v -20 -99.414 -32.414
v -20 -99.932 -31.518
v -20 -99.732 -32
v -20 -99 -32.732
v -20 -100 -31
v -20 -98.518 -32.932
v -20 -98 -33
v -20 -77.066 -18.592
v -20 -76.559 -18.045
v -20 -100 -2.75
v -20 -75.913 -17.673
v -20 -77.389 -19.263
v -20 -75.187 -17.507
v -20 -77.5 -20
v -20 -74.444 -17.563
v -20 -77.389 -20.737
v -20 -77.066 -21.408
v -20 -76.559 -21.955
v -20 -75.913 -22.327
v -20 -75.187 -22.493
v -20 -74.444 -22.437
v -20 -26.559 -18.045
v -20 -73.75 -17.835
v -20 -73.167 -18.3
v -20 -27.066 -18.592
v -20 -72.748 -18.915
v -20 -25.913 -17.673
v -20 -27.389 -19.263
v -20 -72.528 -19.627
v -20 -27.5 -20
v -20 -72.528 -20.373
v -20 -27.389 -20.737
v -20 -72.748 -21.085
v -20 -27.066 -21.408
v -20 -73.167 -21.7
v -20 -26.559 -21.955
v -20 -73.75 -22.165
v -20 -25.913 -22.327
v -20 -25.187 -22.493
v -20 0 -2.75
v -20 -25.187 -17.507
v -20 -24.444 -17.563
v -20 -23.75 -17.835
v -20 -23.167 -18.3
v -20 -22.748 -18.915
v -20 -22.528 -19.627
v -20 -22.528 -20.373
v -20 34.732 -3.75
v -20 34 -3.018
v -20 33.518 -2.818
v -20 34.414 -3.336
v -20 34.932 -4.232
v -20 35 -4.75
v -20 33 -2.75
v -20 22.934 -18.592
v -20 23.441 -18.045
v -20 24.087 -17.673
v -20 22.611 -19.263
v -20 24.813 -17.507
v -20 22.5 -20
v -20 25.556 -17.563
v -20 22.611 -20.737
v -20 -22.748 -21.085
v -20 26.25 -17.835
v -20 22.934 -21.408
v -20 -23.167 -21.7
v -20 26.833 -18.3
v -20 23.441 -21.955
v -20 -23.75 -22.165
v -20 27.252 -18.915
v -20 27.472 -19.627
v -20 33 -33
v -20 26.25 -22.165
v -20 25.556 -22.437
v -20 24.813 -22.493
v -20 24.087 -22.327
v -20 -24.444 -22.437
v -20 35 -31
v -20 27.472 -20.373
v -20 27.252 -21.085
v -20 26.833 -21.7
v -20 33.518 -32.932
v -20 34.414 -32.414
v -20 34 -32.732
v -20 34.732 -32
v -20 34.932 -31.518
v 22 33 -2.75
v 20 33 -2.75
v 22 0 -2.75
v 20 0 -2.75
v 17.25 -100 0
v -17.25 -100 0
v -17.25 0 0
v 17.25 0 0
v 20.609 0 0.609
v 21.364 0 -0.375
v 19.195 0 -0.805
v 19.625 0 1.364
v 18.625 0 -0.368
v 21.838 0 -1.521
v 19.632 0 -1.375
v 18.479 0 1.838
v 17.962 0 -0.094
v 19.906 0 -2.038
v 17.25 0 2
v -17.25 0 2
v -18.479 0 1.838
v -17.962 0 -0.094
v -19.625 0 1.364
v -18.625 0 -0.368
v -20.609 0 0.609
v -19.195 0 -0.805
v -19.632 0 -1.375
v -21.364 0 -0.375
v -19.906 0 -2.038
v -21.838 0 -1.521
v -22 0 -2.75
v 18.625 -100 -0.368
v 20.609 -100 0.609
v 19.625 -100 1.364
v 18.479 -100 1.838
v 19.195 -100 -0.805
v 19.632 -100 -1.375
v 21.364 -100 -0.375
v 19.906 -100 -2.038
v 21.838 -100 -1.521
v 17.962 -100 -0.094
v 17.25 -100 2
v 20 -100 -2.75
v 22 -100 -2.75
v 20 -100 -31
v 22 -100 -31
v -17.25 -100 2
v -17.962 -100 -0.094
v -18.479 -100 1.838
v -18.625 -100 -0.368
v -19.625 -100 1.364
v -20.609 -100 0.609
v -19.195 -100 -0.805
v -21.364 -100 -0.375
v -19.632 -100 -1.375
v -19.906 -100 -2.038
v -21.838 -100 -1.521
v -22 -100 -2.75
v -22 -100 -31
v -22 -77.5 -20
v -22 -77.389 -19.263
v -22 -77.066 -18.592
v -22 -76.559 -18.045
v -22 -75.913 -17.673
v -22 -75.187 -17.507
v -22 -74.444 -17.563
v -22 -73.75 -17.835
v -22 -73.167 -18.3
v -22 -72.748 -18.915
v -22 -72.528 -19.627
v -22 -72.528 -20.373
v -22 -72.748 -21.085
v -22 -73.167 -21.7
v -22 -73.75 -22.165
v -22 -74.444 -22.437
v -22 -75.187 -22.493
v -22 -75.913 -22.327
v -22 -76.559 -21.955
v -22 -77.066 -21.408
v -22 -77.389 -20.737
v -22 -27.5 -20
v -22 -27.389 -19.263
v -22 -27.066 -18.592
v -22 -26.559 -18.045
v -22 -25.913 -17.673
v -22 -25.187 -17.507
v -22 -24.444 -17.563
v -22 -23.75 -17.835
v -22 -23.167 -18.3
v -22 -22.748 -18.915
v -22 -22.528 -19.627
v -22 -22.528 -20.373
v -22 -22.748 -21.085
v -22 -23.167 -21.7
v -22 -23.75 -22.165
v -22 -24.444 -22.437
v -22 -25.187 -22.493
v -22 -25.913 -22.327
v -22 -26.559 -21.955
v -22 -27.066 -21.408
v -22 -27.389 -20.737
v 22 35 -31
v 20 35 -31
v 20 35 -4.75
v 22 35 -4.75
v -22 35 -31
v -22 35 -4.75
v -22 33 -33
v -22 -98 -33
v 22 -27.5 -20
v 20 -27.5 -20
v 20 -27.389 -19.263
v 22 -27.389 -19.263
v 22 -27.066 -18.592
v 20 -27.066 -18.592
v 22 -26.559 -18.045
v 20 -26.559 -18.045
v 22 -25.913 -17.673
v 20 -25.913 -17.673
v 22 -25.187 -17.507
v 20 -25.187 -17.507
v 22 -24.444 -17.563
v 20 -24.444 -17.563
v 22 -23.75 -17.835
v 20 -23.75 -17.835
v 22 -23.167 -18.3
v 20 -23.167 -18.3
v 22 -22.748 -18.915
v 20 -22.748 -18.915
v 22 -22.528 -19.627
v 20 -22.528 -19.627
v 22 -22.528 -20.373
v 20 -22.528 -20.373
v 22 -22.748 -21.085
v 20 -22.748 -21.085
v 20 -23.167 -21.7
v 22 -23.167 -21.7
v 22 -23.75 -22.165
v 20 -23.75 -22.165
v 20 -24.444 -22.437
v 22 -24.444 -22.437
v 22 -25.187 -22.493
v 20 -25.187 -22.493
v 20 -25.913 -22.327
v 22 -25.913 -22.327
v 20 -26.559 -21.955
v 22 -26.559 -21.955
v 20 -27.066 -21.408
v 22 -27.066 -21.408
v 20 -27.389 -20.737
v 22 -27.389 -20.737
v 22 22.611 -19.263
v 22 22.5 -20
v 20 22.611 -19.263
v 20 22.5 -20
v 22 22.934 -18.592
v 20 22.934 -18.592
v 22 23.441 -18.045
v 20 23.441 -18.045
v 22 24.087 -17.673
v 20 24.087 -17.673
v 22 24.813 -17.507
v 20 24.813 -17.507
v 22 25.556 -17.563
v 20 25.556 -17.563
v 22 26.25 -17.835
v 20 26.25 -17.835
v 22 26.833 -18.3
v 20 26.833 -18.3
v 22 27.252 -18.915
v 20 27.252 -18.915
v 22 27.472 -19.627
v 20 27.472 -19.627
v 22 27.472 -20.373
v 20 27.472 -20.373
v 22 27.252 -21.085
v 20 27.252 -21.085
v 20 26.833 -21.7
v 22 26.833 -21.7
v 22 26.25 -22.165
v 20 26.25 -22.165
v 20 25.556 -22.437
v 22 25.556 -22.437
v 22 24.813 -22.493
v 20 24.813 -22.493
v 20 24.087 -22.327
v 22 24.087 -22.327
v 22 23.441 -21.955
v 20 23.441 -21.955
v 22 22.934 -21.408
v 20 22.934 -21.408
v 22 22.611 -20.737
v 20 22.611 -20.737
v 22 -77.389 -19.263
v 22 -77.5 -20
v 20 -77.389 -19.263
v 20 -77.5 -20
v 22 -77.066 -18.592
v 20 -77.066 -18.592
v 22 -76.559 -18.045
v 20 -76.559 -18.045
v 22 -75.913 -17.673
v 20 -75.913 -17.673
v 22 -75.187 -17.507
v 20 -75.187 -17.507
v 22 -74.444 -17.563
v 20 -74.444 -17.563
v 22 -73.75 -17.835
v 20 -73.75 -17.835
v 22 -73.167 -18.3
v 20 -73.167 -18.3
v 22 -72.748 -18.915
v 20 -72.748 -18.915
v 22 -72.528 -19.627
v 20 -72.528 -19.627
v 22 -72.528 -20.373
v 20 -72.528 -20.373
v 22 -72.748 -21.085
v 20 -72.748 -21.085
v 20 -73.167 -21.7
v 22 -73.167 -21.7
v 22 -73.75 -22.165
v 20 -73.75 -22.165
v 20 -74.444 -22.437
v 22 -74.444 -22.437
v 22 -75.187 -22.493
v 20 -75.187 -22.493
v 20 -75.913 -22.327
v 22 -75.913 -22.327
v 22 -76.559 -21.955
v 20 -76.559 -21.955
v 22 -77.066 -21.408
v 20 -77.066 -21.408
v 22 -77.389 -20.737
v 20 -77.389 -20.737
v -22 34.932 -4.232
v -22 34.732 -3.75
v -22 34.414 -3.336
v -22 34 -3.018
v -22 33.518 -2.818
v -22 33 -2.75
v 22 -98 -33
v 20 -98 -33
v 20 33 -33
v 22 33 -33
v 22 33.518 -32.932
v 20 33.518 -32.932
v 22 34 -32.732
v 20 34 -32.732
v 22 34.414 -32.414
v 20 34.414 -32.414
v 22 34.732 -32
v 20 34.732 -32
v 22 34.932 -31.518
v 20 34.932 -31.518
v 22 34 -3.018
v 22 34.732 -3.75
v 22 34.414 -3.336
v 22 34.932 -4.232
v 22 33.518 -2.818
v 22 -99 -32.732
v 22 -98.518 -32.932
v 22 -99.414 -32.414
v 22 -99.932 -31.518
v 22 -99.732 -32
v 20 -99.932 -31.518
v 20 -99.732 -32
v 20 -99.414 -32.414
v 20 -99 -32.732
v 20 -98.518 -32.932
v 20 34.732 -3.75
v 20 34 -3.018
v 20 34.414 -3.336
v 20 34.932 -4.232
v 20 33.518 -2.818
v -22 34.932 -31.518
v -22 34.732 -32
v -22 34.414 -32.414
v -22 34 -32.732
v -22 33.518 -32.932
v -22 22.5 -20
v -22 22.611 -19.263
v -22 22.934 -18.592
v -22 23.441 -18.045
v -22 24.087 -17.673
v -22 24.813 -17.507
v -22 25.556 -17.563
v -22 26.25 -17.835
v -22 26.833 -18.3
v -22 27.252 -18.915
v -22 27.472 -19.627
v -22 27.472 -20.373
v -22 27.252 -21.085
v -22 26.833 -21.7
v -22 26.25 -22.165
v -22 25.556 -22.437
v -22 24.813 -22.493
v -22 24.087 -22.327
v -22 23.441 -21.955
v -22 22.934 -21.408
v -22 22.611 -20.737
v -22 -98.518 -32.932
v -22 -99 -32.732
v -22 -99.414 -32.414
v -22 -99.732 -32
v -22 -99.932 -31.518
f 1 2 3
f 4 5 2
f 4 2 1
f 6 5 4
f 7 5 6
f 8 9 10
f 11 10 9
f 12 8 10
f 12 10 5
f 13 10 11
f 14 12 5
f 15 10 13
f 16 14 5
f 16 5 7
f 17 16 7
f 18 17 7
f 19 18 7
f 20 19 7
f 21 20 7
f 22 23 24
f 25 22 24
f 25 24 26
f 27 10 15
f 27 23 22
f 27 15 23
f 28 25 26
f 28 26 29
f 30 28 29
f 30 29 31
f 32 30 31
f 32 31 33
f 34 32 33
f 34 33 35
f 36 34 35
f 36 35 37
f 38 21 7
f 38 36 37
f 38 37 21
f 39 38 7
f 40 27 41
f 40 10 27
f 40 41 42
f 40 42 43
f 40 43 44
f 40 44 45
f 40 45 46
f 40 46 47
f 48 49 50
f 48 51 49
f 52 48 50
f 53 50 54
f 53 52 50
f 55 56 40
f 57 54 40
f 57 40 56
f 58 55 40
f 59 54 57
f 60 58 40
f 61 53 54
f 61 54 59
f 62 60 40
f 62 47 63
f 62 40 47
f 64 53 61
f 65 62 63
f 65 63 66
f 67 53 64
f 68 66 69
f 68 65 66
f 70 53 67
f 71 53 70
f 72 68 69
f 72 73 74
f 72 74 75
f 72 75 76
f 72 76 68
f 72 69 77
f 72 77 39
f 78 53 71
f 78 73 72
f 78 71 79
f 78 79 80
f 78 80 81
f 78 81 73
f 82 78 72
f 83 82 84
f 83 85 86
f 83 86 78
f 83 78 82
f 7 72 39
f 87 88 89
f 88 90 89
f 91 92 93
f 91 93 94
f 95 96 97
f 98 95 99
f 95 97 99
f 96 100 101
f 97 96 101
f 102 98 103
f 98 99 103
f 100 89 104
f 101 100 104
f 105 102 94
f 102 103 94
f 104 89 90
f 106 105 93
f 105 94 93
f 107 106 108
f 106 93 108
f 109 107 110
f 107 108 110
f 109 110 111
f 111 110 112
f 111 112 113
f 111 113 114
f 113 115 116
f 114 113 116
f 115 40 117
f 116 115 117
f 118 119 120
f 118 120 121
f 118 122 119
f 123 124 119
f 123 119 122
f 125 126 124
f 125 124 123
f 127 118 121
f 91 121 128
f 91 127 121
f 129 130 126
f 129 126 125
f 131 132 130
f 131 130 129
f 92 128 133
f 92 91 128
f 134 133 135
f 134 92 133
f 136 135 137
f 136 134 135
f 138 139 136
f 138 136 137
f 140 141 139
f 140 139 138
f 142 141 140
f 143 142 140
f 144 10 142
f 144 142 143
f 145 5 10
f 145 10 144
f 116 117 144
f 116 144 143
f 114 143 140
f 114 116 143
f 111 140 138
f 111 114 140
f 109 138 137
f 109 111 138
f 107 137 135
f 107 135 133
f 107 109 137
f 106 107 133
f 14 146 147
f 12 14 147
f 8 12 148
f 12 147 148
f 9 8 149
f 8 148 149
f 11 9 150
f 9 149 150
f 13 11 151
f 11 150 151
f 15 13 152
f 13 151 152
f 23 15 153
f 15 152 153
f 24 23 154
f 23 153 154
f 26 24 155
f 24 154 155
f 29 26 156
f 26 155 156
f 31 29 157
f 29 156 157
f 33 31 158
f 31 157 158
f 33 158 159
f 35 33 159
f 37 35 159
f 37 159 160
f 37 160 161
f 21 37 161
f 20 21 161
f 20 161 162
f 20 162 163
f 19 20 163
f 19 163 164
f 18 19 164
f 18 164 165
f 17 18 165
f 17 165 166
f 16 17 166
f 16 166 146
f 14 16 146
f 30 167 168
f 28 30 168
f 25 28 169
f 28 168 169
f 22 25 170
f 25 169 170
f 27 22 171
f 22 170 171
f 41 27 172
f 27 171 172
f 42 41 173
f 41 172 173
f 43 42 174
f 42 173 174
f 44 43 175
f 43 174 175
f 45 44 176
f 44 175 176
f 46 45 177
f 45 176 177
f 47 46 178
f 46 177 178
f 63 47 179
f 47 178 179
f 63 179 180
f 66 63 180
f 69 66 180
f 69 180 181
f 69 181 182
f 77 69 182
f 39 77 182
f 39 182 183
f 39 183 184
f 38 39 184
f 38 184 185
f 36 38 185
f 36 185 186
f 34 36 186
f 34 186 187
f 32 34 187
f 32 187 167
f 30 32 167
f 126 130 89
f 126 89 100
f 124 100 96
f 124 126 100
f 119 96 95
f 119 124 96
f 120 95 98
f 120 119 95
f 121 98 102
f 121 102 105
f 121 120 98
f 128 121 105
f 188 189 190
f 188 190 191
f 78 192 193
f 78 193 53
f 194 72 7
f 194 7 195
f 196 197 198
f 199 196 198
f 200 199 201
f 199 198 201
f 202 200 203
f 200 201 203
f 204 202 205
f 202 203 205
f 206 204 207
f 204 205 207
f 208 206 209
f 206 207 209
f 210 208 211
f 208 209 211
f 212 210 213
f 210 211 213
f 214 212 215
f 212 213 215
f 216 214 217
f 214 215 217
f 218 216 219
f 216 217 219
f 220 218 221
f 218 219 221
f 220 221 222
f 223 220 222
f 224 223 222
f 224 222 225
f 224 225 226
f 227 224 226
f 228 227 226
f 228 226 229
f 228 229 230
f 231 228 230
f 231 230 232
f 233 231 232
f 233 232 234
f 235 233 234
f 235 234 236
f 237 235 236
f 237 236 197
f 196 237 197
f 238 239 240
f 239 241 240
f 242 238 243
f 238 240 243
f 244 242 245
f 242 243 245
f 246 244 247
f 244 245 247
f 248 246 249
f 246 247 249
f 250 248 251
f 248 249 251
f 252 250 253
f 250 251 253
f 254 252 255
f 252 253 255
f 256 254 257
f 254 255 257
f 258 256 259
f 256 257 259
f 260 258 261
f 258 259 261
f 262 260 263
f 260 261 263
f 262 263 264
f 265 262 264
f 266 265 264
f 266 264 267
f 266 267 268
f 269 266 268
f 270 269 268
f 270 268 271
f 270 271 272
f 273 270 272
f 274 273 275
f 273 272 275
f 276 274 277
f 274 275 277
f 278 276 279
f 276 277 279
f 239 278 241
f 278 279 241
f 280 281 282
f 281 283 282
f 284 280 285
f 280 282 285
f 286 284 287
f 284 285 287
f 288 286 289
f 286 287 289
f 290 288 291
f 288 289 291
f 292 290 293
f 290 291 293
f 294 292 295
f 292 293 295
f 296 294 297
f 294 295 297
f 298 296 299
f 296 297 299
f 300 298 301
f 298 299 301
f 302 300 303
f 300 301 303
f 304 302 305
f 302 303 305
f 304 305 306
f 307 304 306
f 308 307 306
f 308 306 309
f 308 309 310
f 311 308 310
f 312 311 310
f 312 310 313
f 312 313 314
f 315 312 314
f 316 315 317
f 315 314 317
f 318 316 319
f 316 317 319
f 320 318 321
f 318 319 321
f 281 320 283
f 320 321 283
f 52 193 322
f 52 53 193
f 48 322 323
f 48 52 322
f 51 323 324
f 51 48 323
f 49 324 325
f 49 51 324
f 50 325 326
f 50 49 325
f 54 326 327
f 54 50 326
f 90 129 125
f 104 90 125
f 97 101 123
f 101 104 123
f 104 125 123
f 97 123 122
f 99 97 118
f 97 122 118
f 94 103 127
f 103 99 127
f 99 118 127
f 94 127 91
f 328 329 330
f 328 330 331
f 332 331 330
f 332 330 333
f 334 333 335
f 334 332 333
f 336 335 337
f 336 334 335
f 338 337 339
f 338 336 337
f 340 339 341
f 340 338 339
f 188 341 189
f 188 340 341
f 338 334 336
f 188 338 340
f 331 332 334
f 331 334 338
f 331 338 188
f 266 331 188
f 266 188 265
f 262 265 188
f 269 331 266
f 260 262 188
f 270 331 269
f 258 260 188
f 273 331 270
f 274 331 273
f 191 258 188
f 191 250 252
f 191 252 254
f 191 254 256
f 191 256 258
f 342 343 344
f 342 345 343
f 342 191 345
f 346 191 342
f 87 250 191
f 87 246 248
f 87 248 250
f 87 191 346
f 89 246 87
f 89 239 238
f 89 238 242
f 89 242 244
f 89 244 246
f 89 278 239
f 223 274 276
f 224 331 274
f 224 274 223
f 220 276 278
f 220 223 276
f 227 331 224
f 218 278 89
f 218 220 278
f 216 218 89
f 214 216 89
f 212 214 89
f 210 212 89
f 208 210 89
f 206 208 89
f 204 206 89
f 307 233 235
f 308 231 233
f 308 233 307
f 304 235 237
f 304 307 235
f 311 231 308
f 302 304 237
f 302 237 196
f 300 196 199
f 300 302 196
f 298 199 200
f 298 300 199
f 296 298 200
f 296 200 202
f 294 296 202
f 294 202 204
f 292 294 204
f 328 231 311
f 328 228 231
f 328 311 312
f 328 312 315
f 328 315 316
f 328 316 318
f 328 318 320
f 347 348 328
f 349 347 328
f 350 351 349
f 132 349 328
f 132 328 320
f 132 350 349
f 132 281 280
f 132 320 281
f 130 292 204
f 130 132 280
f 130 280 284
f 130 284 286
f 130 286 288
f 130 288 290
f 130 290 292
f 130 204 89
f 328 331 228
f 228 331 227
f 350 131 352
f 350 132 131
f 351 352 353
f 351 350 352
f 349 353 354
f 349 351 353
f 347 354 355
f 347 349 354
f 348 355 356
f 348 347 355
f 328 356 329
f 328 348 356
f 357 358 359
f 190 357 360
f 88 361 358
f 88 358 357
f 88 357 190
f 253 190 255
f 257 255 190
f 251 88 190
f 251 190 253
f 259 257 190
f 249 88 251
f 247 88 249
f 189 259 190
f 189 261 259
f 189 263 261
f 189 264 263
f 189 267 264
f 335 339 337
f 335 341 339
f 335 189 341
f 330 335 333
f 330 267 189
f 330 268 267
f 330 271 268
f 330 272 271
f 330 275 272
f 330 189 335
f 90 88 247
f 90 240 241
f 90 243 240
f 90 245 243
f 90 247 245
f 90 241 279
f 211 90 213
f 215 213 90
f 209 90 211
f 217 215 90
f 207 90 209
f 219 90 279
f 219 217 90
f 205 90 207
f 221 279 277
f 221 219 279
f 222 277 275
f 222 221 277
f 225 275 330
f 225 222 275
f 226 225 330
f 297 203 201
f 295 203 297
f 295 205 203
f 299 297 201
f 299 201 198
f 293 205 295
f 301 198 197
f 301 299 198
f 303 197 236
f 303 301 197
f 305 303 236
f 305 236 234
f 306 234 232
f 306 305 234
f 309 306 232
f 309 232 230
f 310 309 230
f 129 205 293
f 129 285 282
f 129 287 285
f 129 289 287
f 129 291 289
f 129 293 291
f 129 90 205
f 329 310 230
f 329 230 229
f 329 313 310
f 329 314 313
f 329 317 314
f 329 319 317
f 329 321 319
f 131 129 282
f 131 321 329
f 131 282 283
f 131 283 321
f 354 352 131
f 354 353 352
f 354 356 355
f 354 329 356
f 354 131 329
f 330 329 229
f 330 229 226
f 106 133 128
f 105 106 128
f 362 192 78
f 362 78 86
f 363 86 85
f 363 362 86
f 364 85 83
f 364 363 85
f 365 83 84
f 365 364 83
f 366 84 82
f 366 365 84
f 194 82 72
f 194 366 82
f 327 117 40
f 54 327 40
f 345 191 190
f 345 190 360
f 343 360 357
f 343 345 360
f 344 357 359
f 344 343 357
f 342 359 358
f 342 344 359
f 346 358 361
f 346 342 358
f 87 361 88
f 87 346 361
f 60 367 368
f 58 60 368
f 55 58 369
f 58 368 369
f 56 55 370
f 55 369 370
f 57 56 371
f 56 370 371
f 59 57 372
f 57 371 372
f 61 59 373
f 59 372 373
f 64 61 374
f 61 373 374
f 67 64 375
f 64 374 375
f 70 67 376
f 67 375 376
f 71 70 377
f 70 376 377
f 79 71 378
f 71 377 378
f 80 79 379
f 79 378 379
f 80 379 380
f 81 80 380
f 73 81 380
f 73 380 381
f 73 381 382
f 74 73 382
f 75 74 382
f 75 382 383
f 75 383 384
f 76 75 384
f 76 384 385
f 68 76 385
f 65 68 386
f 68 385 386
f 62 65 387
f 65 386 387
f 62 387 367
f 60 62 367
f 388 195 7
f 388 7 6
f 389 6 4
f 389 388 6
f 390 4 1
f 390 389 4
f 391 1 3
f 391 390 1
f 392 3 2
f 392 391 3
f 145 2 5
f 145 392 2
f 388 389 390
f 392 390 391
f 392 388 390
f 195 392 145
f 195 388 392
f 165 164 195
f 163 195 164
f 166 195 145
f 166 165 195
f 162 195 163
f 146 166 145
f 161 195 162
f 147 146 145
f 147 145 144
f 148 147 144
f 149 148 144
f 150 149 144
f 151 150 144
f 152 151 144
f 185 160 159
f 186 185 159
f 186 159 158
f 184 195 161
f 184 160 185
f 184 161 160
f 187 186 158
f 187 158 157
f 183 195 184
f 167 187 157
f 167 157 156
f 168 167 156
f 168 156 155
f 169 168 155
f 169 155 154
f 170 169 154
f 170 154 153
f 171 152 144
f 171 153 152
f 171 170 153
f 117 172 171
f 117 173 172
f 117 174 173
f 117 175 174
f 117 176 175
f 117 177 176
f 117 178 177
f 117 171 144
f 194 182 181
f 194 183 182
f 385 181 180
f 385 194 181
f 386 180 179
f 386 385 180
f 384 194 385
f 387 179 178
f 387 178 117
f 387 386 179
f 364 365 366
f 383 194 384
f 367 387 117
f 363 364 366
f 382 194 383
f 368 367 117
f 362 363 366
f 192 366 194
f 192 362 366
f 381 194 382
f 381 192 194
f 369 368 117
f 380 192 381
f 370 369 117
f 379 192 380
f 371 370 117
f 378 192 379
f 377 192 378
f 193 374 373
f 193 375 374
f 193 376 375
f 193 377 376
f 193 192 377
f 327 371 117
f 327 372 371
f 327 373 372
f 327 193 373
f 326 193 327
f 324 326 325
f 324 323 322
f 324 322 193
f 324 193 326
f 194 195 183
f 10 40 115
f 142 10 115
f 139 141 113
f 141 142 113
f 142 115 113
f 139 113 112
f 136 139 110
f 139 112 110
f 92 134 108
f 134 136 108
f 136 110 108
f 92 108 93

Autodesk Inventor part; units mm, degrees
ref_plane "YZ Plane" through (0, 0, 0) normal (1, 0, 0) x (0, 1, 0)
ref_plane "XZ Plane" through (0, 0, 0) normal (0, 1, 0) x (-1, 0, 0)
ref_plane "XY Plane" through (0, 0, 0) normal (0, 0, 1) x (1, 0, 0)
sketch "Sketch1" plane through (0, 0, 0) normal (0, 0, 1) x (1, 0, 0)
  line L0 (-20, 0) -> (20, 0)
  line L1 (20, 0) -> (20, -100)
  line L2 (20, -100) -> (-20, -100)
  line L3 (-20, -100) -> (-20, 0)
  point P0 (0, 0)
  point P1 (0, 0)
  dimension "d0" = 40
  dimension "d1" = 100
extrude "Plate1" add sketch "Sketch1" along normal blind 2
sketch "Sketch2" plane through (20, -100, 0) normal (1, 0, 0) x (0, 1, 0)
  line L0 (100, 0) -> (0, 0)
  line L1 (0, 0) -> (0, -33)
  line L2 (0, -33) -> (100, -33)
  line L3 (100, -33) -> (100, 0)
edge flange "Flange1" height 35 angle 90 thickness 2 bend radius 2.75 thickness toward (1, 0, 0) relief round relief width 2 relief depth 1 corner gap 2.75 corner form 0 edges at (20, -50, 0) (-20, -50, 0) wall of the first edge with corners at (20, 0, 0) (20, -100, 0) (20, -100, -33) (20, 0, -33)
bend "Bend1"
corner "Corner1"
sketch "Sketch5" plane through (-17.25, 0, 0) normal (0, 1, 0) x (1, 0, 0)
  line L0 (-4.75, 2.75) -> (-2.75, 2.75) projected
  line L1 (-2.75, 2.75) -> (-2.75, 33) projected
  line L2 (-2.75, 33) -> (-4.75, 33) projected
  line L3 (-4.75, 33) -> (-4.75, 2.75) projected
  line L4 (37.25, 2.75) -> (39.25, 2.75) projected
  line L5 (39.25, 2.75) -> (39.25, 33) projected
  line L6 (37.25, 33) -> (39.25, 33) projected
  line L7 (37.25, 2.75) -> (37.25, 33) projected
  point P0 (17.25, 0)
extrude "Extrusion2" add sketch "Sketch5" along normal blind 35
sketch "Sketch3" plane through (0, 0, 0) normal (1, 0, 0) x (0, 1, 0)
  line L0 (0, -33) -> (-100, -33) projected
  line L1 (-75, -20) -> (-75, -20) construction
  line L2 (-77.5, -20) -> (-77.5, -20)
  line L3 (-72.5, -20) -> (-72.5, -20)
  arc A0 (-72.5, -20) -> (-77.5, -20) centre (-75, -20) ccw
  arc A1 (-77.5, -20) -> (-72.5, -20) centre (-75, -20) ccw
  line L4 (-100, -2.75) -> (-100, -33) projected
  point P0 (0, 0)
  dimension "d14" = 0
  dimension "d15" = 13
  dimension "d17" = 2.5
  dimension "d18" = 25
extrude "Extrusion1" cut sketch "Sketch3" along normal through all both and the other way through all
pattern_linear "Rectangular Pattern1" count 3 spacing 50 along (0, 1, 0) of "Extrusion1"
fillet "Fillet1" radius 2 6 edges at (21, 35, -2.75) (-21, 35, -2.75) (-21, 35, -33) (21, 35, -33) (21, -100, -33) (-21, -100, -33)
equation "\"d2\" = Thickness"
equation "\"d3\" = BendReliefWidth"
equation "\"d4\" = BendReliefDepth"
equation "\"d5\" = MinimumRemnant"
equation "\"d6\" = TransitionRadius"
equation "\"d9\" = BendRadius"
equation "\"d10\" = CornerReliefSize"
equation "\"d11\" = GapSize"
equation "\"d12\" = JacobiRadiusSize"
equation "\"BendReliefWidth\" = Thickness"
equation "\"BendReliefDepth\" = 0.5 * Thickness"
equation "\"CornerReliefSize\" = 4 * Thickness"
equation "\"MinimumRemnant\" = 2 * Thickness"
equation "\"TransitionRadius\" = BendRadius"
equation "\"JacobiRadiusSize\" = BendRadius"
equation "\"GapSize\" = Thickness"
equation "\"Thickness\" = 2"
equation "\"BendRadius\" = 2.75"
properties part number "NDM 4.0.8 bracket1" material "Stainless Steel"
